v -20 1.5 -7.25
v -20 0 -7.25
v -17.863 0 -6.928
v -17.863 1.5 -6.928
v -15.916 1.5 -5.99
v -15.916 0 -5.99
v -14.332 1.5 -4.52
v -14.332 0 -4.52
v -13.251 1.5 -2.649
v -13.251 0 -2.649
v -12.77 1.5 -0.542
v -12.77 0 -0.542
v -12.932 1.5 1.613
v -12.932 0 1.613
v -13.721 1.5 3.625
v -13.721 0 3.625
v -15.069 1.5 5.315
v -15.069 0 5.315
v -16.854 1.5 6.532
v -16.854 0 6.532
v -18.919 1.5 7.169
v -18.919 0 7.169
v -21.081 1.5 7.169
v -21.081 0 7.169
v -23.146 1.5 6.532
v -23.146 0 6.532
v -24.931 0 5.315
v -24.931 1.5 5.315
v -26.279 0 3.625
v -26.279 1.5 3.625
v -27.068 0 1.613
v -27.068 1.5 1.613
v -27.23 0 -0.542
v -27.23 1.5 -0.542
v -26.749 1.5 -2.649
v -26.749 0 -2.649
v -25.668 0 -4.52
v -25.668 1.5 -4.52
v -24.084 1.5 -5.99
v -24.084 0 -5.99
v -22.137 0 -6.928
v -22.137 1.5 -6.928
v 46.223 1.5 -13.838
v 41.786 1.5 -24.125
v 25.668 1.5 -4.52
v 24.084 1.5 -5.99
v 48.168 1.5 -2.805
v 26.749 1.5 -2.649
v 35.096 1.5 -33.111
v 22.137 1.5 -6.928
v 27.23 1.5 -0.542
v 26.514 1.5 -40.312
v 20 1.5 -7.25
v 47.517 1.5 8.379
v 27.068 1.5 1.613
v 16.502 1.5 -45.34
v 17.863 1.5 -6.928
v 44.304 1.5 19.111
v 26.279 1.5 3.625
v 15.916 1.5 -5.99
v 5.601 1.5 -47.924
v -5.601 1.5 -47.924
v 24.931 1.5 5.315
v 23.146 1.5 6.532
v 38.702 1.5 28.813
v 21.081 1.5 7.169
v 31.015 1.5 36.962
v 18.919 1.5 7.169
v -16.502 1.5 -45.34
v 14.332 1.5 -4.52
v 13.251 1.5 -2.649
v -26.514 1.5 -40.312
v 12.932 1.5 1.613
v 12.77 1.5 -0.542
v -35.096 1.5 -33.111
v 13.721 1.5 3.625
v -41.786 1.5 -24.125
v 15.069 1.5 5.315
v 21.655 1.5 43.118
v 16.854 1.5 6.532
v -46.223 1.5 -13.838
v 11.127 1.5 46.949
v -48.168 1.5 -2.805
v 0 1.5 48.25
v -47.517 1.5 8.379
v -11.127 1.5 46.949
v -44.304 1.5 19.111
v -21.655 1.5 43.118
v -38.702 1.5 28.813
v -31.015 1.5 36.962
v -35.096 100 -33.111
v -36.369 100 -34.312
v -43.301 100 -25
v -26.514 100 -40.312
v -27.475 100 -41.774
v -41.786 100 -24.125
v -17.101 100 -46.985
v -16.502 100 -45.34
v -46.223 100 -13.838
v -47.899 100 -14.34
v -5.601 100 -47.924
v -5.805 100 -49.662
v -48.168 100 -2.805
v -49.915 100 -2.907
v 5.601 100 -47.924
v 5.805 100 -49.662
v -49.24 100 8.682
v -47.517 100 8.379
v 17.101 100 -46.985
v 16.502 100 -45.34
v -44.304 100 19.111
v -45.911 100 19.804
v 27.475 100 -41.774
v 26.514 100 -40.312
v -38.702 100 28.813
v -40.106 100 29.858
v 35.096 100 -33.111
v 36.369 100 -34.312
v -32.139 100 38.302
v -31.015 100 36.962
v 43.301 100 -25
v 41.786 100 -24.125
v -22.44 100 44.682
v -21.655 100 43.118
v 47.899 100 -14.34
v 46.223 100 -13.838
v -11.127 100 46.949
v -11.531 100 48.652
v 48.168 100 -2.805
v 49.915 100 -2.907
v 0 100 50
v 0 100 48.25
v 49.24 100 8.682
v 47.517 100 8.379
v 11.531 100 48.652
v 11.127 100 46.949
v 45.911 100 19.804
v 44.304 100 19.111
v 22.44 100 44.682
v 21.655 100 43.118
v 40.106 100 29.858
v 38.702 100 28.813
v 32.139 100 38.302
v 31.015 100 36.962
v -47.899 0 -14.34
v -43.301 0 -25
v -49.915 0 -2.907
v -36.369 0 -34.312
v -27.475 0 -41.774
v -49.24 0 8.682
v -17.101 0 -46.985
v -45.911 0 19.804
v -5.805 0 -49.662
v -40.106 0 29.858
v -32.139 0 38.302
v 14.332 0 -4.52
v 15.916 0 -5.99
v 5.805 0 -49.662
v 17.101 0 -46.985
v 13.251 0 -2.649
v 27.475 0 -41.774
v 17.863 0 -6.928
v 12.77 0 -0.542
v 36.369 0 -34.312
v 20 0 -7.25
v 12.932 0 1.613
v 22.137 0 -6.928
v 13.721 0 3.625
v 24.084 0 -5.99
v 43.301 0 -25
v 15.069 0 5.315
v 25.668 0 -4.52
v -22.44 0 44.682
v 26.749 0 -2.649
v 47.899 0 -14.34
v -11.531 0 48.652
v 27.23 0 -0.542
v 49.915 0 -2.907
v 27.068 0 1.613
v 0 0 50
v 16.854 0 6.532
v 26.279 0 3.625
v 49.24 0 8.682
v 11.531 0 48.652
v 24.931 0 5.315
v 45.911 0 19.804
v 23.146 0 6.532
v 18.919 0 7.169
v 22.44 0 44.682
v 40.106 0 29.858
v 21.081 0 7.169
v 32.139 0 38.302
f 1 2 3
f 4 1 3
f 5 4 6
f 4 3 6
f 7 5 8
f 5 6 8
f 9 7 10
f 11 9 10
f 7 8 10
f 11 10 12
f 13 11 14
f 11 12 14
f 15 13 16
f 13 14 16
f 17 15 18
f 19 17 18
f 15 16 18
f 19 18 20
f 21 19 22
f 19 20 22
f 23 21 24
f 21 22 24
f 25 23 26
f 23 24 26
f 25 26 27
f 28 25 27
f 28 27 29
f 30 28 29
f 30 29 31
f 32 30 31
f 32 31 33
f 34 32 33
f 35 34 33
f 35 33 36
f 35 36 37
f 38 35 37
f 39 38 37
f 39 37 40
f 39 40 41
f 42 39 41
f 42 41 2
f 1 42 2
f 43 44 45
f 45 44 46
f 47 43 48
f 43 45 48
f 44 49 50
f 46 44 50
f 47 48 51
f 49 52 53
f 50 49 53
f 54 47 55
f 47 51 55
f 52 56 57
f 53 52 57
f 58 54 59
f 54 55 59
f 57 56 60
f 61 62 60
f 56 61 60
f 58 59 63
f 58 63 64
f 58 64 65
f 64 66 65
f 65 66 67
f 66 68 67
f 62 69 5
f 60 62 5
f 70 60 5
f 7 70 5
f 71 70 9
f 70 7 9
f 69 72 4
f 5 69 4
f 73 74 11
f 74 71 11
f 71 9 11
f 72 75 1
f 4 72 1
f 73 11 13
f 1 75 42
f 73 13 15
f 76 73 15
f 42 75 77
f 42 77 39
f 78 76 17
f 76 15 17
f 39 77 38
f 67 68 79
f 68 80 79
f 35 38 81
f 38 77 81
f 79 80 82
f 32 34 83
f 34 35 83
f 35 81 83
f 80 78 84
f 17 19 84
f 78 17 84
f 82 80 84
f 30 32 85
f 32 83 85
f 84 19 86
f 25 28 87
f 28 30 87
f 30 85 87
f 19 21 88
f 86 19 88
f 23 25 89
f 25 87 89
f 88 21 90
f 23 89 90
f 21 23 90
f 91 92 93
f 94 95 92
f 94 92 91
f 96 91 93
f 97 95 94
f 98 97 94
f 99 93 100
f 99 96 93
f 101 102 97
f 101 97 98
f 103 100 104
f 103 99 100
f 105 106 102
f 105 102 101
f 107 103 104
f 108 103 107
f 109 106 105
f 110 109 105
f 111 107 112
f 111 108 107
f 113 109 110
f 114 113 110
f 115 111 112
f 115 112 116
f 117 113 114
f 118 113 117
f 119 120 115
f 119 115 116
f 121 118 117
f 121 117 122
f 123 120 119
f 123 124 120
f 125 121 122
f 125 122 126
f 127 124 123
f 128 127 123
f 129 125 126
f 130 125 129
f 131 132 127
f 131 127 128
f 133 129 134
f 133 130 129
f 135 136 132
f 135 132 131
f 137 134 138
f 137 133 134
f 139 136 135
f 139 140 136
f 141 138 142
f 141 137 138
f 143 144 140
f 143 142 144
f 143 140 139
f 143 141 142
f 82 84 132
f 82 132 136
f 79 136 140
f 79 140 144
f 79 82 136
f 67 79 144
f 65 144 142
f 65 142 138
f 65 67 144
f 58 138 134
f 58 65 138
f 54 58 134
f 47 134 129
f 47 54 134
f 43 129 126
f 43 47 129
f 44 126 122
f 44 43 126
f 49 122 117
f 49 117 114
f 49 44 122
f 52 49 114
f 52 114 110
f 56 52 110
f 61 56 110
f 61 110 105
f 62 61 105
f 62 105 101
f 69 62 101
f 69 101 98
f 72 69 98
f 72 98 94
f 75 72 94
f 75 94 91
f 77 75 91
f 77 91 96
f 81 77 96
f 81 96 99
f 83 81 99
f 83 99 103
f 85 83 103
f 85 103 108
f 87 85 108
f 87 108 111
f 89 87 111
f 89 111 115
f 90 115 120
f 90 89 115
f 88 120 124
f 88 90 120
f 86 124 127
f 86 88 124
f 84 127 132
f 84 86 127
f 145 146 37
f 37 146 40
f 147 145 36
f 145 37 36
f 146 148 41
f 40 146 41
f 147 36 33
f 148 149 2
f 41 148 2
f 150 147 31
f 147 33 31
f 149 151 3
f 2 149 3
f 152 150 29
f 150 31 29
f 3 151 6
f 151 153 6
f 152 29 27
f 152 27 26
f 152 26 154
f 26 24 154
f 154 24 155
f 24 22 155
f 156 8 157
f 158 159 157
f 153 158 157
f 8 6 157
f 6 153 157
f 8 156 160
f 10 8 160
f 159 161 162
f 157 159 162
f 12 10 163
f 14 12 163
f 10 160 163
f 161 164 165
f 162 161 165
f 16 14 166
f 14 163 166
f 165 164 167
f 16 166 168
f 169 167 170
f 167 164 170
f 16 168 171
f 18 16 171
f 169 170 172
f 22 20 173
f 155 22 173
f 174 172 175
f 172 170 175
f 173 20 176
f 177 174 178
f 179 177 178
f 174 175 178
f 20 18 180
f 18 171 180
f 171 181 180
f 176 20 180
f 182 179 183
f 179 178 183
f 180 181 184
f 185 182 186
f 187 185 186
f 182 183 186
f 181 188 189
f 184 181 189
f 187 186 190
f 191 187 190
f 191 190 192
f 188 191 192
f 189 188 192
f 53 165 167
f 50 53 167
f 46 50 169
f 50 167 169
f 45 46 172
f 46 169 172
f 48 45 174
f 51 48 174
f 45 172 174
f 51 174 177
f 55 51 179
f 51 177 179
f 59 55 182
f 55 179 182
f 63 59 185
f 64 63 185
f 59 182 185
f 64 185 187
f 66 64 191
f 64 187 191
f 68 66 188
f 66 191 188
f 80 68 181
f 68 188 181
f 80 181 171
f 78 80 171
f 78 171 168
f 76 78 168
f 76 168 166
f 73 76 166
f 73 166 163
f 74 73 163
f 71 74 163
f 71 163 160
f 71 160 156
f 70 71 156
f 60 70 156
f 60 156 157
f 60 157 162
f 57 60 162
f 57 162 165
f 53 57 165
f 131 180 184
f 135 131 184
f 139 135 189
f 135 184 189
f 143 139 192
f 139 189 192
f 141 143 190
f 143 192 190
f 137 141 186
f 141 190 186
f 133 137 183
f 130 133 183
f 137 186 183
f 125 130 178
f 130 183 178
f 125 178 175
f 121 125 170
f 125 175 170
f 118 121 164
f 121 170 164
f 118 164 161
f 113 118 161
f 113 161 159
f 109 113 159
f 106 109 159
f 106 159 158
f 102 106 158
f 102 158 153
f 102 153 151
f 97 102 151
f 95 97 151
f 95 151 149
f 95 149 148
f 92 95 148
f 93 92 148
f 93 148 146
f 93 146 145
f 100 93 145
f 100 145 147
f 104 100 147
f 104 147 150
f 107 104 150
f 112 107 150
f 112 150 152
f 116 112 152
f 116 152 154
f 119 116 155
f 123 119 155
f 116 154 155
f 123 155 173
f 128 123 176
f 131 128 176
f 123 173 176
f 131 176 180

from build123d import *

# Parameters (mm, degrees)
SKETCH1_R           = 50
SKETCH1_R_2         = 48.25
BOSS_EXTRUDE1_DEPTH = 100
SKETCH2_R           = 50
BOSS_EXTRUDE2_DEPTH = 1.5
SKETCH3_R           = 7.25
CUT_EXTRUDE1_DEPTH  = 2.5


with BuildPart() as part:
    # Sketch1 → Boss-Extrude1 (new body)
    with BuildSketch(Plane(origin=(0, 0, 0), x_dir=(1, 0, 0), z_dir=(0, 1, 0))):
        with Locations(Location((0, 0, 0), (0, 0, 270))):
            Circle(SKETCH1_R)
        with Locations(Location((0, 0, 0), (0, 0, 270))):
            Circle(SKETCH1_R_2, mode=Mode.SUBTRACT)
    extrude(amount=BOSS_EXTRUDE1_DEPTH)

    # Sketch2 → Boss-Extrude2 (add)
    with BuildSketch(Plane.XZ):
        with Locations(Location((0, 0, 0), (0, 0, 90))):
            Circle(SKETCH2_R)
    extrude(amount=-BOSS_EXTRUDE2_DEPTH)

    # Sketch3 → Cut-Extrude1 (cut)
    with BuildSketch(Plane.XZ):
        with Locations(Location((-20, 0, 0), (0, 0, 270))):
            Circle(SKETCH3_R)
        with Locations(Location((20, 0, 0), (0, 0, 270))):
            Circle(SKETCH3_R)
    extrude(amount=-CUT_EXTRUDE1_DEPTH, mode=Mode.SUBTRACT)


solid = part.part
